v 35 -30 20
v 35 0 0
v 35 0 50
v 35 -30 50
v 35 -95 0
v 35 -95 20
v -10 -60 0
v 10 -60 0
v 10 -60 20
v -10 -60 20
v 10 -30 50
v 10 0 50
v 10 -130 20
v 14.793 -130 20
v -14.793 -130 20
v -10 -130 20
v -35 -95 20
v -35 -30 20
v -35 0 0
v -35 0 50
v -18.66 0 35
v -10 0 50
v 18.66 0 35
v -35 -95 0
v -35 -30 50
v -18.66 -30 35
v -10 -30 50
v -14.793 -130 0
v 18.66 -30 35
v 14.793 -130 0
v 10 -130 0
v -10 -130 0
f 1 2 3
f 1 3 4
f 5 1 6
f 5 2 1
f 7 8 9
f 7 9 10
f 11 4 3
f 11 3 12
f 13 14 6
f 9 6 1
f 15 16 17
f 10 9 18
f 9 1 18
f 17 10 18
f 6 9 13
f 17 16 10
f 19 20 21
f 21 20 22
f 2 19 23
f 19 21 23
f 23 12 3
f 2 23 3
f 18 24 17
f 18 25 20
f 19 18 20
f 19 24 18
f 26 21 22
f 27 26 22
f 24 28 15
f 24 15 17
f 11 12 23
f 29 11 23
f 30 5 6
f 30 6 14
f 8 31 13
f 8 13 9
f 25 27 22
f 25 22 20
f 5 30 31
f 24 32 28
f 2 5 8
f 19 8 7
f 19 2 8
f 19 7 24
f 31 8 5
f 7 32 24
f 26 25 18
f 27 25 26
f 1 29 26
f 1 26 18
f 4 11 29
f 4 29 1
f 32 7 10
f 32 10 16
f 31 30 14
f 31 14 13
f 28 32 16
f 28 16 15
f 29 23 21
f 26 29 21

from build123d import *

# Parameters (mm, degrees)
PAD_DEPTH    = 20
PAD001_DEPTH = 30


with BuildPart() as pad:
    # Sketch → Pad (new body)
    with BuildSketch(Plane.XY):
        Polygon((-35, -30), (35, -30), (35, -95), (14.792741, -130), (10, -130), (10, -60), (-10, -60), (-10, -130), (-14.792741, -130), (-35, -95), align=None)
    extrude(amount=PAD_DEPTH)


with BuildPart() as fusion:
    # Sketch001 → Pad001 (new body)
    with BuildSketch(Plane.XZ):
        Polygon((-35, 0), (35, 0), (35, 50), (10, 50), (18.660254, 35), (-18.660254, 35), (-10, 50), (-35, 50), align=None)
    extrude(amount=PAD001_DEPTH)

    # Fusion: union Pad
    add(pad.part)


solid = fusion.part
